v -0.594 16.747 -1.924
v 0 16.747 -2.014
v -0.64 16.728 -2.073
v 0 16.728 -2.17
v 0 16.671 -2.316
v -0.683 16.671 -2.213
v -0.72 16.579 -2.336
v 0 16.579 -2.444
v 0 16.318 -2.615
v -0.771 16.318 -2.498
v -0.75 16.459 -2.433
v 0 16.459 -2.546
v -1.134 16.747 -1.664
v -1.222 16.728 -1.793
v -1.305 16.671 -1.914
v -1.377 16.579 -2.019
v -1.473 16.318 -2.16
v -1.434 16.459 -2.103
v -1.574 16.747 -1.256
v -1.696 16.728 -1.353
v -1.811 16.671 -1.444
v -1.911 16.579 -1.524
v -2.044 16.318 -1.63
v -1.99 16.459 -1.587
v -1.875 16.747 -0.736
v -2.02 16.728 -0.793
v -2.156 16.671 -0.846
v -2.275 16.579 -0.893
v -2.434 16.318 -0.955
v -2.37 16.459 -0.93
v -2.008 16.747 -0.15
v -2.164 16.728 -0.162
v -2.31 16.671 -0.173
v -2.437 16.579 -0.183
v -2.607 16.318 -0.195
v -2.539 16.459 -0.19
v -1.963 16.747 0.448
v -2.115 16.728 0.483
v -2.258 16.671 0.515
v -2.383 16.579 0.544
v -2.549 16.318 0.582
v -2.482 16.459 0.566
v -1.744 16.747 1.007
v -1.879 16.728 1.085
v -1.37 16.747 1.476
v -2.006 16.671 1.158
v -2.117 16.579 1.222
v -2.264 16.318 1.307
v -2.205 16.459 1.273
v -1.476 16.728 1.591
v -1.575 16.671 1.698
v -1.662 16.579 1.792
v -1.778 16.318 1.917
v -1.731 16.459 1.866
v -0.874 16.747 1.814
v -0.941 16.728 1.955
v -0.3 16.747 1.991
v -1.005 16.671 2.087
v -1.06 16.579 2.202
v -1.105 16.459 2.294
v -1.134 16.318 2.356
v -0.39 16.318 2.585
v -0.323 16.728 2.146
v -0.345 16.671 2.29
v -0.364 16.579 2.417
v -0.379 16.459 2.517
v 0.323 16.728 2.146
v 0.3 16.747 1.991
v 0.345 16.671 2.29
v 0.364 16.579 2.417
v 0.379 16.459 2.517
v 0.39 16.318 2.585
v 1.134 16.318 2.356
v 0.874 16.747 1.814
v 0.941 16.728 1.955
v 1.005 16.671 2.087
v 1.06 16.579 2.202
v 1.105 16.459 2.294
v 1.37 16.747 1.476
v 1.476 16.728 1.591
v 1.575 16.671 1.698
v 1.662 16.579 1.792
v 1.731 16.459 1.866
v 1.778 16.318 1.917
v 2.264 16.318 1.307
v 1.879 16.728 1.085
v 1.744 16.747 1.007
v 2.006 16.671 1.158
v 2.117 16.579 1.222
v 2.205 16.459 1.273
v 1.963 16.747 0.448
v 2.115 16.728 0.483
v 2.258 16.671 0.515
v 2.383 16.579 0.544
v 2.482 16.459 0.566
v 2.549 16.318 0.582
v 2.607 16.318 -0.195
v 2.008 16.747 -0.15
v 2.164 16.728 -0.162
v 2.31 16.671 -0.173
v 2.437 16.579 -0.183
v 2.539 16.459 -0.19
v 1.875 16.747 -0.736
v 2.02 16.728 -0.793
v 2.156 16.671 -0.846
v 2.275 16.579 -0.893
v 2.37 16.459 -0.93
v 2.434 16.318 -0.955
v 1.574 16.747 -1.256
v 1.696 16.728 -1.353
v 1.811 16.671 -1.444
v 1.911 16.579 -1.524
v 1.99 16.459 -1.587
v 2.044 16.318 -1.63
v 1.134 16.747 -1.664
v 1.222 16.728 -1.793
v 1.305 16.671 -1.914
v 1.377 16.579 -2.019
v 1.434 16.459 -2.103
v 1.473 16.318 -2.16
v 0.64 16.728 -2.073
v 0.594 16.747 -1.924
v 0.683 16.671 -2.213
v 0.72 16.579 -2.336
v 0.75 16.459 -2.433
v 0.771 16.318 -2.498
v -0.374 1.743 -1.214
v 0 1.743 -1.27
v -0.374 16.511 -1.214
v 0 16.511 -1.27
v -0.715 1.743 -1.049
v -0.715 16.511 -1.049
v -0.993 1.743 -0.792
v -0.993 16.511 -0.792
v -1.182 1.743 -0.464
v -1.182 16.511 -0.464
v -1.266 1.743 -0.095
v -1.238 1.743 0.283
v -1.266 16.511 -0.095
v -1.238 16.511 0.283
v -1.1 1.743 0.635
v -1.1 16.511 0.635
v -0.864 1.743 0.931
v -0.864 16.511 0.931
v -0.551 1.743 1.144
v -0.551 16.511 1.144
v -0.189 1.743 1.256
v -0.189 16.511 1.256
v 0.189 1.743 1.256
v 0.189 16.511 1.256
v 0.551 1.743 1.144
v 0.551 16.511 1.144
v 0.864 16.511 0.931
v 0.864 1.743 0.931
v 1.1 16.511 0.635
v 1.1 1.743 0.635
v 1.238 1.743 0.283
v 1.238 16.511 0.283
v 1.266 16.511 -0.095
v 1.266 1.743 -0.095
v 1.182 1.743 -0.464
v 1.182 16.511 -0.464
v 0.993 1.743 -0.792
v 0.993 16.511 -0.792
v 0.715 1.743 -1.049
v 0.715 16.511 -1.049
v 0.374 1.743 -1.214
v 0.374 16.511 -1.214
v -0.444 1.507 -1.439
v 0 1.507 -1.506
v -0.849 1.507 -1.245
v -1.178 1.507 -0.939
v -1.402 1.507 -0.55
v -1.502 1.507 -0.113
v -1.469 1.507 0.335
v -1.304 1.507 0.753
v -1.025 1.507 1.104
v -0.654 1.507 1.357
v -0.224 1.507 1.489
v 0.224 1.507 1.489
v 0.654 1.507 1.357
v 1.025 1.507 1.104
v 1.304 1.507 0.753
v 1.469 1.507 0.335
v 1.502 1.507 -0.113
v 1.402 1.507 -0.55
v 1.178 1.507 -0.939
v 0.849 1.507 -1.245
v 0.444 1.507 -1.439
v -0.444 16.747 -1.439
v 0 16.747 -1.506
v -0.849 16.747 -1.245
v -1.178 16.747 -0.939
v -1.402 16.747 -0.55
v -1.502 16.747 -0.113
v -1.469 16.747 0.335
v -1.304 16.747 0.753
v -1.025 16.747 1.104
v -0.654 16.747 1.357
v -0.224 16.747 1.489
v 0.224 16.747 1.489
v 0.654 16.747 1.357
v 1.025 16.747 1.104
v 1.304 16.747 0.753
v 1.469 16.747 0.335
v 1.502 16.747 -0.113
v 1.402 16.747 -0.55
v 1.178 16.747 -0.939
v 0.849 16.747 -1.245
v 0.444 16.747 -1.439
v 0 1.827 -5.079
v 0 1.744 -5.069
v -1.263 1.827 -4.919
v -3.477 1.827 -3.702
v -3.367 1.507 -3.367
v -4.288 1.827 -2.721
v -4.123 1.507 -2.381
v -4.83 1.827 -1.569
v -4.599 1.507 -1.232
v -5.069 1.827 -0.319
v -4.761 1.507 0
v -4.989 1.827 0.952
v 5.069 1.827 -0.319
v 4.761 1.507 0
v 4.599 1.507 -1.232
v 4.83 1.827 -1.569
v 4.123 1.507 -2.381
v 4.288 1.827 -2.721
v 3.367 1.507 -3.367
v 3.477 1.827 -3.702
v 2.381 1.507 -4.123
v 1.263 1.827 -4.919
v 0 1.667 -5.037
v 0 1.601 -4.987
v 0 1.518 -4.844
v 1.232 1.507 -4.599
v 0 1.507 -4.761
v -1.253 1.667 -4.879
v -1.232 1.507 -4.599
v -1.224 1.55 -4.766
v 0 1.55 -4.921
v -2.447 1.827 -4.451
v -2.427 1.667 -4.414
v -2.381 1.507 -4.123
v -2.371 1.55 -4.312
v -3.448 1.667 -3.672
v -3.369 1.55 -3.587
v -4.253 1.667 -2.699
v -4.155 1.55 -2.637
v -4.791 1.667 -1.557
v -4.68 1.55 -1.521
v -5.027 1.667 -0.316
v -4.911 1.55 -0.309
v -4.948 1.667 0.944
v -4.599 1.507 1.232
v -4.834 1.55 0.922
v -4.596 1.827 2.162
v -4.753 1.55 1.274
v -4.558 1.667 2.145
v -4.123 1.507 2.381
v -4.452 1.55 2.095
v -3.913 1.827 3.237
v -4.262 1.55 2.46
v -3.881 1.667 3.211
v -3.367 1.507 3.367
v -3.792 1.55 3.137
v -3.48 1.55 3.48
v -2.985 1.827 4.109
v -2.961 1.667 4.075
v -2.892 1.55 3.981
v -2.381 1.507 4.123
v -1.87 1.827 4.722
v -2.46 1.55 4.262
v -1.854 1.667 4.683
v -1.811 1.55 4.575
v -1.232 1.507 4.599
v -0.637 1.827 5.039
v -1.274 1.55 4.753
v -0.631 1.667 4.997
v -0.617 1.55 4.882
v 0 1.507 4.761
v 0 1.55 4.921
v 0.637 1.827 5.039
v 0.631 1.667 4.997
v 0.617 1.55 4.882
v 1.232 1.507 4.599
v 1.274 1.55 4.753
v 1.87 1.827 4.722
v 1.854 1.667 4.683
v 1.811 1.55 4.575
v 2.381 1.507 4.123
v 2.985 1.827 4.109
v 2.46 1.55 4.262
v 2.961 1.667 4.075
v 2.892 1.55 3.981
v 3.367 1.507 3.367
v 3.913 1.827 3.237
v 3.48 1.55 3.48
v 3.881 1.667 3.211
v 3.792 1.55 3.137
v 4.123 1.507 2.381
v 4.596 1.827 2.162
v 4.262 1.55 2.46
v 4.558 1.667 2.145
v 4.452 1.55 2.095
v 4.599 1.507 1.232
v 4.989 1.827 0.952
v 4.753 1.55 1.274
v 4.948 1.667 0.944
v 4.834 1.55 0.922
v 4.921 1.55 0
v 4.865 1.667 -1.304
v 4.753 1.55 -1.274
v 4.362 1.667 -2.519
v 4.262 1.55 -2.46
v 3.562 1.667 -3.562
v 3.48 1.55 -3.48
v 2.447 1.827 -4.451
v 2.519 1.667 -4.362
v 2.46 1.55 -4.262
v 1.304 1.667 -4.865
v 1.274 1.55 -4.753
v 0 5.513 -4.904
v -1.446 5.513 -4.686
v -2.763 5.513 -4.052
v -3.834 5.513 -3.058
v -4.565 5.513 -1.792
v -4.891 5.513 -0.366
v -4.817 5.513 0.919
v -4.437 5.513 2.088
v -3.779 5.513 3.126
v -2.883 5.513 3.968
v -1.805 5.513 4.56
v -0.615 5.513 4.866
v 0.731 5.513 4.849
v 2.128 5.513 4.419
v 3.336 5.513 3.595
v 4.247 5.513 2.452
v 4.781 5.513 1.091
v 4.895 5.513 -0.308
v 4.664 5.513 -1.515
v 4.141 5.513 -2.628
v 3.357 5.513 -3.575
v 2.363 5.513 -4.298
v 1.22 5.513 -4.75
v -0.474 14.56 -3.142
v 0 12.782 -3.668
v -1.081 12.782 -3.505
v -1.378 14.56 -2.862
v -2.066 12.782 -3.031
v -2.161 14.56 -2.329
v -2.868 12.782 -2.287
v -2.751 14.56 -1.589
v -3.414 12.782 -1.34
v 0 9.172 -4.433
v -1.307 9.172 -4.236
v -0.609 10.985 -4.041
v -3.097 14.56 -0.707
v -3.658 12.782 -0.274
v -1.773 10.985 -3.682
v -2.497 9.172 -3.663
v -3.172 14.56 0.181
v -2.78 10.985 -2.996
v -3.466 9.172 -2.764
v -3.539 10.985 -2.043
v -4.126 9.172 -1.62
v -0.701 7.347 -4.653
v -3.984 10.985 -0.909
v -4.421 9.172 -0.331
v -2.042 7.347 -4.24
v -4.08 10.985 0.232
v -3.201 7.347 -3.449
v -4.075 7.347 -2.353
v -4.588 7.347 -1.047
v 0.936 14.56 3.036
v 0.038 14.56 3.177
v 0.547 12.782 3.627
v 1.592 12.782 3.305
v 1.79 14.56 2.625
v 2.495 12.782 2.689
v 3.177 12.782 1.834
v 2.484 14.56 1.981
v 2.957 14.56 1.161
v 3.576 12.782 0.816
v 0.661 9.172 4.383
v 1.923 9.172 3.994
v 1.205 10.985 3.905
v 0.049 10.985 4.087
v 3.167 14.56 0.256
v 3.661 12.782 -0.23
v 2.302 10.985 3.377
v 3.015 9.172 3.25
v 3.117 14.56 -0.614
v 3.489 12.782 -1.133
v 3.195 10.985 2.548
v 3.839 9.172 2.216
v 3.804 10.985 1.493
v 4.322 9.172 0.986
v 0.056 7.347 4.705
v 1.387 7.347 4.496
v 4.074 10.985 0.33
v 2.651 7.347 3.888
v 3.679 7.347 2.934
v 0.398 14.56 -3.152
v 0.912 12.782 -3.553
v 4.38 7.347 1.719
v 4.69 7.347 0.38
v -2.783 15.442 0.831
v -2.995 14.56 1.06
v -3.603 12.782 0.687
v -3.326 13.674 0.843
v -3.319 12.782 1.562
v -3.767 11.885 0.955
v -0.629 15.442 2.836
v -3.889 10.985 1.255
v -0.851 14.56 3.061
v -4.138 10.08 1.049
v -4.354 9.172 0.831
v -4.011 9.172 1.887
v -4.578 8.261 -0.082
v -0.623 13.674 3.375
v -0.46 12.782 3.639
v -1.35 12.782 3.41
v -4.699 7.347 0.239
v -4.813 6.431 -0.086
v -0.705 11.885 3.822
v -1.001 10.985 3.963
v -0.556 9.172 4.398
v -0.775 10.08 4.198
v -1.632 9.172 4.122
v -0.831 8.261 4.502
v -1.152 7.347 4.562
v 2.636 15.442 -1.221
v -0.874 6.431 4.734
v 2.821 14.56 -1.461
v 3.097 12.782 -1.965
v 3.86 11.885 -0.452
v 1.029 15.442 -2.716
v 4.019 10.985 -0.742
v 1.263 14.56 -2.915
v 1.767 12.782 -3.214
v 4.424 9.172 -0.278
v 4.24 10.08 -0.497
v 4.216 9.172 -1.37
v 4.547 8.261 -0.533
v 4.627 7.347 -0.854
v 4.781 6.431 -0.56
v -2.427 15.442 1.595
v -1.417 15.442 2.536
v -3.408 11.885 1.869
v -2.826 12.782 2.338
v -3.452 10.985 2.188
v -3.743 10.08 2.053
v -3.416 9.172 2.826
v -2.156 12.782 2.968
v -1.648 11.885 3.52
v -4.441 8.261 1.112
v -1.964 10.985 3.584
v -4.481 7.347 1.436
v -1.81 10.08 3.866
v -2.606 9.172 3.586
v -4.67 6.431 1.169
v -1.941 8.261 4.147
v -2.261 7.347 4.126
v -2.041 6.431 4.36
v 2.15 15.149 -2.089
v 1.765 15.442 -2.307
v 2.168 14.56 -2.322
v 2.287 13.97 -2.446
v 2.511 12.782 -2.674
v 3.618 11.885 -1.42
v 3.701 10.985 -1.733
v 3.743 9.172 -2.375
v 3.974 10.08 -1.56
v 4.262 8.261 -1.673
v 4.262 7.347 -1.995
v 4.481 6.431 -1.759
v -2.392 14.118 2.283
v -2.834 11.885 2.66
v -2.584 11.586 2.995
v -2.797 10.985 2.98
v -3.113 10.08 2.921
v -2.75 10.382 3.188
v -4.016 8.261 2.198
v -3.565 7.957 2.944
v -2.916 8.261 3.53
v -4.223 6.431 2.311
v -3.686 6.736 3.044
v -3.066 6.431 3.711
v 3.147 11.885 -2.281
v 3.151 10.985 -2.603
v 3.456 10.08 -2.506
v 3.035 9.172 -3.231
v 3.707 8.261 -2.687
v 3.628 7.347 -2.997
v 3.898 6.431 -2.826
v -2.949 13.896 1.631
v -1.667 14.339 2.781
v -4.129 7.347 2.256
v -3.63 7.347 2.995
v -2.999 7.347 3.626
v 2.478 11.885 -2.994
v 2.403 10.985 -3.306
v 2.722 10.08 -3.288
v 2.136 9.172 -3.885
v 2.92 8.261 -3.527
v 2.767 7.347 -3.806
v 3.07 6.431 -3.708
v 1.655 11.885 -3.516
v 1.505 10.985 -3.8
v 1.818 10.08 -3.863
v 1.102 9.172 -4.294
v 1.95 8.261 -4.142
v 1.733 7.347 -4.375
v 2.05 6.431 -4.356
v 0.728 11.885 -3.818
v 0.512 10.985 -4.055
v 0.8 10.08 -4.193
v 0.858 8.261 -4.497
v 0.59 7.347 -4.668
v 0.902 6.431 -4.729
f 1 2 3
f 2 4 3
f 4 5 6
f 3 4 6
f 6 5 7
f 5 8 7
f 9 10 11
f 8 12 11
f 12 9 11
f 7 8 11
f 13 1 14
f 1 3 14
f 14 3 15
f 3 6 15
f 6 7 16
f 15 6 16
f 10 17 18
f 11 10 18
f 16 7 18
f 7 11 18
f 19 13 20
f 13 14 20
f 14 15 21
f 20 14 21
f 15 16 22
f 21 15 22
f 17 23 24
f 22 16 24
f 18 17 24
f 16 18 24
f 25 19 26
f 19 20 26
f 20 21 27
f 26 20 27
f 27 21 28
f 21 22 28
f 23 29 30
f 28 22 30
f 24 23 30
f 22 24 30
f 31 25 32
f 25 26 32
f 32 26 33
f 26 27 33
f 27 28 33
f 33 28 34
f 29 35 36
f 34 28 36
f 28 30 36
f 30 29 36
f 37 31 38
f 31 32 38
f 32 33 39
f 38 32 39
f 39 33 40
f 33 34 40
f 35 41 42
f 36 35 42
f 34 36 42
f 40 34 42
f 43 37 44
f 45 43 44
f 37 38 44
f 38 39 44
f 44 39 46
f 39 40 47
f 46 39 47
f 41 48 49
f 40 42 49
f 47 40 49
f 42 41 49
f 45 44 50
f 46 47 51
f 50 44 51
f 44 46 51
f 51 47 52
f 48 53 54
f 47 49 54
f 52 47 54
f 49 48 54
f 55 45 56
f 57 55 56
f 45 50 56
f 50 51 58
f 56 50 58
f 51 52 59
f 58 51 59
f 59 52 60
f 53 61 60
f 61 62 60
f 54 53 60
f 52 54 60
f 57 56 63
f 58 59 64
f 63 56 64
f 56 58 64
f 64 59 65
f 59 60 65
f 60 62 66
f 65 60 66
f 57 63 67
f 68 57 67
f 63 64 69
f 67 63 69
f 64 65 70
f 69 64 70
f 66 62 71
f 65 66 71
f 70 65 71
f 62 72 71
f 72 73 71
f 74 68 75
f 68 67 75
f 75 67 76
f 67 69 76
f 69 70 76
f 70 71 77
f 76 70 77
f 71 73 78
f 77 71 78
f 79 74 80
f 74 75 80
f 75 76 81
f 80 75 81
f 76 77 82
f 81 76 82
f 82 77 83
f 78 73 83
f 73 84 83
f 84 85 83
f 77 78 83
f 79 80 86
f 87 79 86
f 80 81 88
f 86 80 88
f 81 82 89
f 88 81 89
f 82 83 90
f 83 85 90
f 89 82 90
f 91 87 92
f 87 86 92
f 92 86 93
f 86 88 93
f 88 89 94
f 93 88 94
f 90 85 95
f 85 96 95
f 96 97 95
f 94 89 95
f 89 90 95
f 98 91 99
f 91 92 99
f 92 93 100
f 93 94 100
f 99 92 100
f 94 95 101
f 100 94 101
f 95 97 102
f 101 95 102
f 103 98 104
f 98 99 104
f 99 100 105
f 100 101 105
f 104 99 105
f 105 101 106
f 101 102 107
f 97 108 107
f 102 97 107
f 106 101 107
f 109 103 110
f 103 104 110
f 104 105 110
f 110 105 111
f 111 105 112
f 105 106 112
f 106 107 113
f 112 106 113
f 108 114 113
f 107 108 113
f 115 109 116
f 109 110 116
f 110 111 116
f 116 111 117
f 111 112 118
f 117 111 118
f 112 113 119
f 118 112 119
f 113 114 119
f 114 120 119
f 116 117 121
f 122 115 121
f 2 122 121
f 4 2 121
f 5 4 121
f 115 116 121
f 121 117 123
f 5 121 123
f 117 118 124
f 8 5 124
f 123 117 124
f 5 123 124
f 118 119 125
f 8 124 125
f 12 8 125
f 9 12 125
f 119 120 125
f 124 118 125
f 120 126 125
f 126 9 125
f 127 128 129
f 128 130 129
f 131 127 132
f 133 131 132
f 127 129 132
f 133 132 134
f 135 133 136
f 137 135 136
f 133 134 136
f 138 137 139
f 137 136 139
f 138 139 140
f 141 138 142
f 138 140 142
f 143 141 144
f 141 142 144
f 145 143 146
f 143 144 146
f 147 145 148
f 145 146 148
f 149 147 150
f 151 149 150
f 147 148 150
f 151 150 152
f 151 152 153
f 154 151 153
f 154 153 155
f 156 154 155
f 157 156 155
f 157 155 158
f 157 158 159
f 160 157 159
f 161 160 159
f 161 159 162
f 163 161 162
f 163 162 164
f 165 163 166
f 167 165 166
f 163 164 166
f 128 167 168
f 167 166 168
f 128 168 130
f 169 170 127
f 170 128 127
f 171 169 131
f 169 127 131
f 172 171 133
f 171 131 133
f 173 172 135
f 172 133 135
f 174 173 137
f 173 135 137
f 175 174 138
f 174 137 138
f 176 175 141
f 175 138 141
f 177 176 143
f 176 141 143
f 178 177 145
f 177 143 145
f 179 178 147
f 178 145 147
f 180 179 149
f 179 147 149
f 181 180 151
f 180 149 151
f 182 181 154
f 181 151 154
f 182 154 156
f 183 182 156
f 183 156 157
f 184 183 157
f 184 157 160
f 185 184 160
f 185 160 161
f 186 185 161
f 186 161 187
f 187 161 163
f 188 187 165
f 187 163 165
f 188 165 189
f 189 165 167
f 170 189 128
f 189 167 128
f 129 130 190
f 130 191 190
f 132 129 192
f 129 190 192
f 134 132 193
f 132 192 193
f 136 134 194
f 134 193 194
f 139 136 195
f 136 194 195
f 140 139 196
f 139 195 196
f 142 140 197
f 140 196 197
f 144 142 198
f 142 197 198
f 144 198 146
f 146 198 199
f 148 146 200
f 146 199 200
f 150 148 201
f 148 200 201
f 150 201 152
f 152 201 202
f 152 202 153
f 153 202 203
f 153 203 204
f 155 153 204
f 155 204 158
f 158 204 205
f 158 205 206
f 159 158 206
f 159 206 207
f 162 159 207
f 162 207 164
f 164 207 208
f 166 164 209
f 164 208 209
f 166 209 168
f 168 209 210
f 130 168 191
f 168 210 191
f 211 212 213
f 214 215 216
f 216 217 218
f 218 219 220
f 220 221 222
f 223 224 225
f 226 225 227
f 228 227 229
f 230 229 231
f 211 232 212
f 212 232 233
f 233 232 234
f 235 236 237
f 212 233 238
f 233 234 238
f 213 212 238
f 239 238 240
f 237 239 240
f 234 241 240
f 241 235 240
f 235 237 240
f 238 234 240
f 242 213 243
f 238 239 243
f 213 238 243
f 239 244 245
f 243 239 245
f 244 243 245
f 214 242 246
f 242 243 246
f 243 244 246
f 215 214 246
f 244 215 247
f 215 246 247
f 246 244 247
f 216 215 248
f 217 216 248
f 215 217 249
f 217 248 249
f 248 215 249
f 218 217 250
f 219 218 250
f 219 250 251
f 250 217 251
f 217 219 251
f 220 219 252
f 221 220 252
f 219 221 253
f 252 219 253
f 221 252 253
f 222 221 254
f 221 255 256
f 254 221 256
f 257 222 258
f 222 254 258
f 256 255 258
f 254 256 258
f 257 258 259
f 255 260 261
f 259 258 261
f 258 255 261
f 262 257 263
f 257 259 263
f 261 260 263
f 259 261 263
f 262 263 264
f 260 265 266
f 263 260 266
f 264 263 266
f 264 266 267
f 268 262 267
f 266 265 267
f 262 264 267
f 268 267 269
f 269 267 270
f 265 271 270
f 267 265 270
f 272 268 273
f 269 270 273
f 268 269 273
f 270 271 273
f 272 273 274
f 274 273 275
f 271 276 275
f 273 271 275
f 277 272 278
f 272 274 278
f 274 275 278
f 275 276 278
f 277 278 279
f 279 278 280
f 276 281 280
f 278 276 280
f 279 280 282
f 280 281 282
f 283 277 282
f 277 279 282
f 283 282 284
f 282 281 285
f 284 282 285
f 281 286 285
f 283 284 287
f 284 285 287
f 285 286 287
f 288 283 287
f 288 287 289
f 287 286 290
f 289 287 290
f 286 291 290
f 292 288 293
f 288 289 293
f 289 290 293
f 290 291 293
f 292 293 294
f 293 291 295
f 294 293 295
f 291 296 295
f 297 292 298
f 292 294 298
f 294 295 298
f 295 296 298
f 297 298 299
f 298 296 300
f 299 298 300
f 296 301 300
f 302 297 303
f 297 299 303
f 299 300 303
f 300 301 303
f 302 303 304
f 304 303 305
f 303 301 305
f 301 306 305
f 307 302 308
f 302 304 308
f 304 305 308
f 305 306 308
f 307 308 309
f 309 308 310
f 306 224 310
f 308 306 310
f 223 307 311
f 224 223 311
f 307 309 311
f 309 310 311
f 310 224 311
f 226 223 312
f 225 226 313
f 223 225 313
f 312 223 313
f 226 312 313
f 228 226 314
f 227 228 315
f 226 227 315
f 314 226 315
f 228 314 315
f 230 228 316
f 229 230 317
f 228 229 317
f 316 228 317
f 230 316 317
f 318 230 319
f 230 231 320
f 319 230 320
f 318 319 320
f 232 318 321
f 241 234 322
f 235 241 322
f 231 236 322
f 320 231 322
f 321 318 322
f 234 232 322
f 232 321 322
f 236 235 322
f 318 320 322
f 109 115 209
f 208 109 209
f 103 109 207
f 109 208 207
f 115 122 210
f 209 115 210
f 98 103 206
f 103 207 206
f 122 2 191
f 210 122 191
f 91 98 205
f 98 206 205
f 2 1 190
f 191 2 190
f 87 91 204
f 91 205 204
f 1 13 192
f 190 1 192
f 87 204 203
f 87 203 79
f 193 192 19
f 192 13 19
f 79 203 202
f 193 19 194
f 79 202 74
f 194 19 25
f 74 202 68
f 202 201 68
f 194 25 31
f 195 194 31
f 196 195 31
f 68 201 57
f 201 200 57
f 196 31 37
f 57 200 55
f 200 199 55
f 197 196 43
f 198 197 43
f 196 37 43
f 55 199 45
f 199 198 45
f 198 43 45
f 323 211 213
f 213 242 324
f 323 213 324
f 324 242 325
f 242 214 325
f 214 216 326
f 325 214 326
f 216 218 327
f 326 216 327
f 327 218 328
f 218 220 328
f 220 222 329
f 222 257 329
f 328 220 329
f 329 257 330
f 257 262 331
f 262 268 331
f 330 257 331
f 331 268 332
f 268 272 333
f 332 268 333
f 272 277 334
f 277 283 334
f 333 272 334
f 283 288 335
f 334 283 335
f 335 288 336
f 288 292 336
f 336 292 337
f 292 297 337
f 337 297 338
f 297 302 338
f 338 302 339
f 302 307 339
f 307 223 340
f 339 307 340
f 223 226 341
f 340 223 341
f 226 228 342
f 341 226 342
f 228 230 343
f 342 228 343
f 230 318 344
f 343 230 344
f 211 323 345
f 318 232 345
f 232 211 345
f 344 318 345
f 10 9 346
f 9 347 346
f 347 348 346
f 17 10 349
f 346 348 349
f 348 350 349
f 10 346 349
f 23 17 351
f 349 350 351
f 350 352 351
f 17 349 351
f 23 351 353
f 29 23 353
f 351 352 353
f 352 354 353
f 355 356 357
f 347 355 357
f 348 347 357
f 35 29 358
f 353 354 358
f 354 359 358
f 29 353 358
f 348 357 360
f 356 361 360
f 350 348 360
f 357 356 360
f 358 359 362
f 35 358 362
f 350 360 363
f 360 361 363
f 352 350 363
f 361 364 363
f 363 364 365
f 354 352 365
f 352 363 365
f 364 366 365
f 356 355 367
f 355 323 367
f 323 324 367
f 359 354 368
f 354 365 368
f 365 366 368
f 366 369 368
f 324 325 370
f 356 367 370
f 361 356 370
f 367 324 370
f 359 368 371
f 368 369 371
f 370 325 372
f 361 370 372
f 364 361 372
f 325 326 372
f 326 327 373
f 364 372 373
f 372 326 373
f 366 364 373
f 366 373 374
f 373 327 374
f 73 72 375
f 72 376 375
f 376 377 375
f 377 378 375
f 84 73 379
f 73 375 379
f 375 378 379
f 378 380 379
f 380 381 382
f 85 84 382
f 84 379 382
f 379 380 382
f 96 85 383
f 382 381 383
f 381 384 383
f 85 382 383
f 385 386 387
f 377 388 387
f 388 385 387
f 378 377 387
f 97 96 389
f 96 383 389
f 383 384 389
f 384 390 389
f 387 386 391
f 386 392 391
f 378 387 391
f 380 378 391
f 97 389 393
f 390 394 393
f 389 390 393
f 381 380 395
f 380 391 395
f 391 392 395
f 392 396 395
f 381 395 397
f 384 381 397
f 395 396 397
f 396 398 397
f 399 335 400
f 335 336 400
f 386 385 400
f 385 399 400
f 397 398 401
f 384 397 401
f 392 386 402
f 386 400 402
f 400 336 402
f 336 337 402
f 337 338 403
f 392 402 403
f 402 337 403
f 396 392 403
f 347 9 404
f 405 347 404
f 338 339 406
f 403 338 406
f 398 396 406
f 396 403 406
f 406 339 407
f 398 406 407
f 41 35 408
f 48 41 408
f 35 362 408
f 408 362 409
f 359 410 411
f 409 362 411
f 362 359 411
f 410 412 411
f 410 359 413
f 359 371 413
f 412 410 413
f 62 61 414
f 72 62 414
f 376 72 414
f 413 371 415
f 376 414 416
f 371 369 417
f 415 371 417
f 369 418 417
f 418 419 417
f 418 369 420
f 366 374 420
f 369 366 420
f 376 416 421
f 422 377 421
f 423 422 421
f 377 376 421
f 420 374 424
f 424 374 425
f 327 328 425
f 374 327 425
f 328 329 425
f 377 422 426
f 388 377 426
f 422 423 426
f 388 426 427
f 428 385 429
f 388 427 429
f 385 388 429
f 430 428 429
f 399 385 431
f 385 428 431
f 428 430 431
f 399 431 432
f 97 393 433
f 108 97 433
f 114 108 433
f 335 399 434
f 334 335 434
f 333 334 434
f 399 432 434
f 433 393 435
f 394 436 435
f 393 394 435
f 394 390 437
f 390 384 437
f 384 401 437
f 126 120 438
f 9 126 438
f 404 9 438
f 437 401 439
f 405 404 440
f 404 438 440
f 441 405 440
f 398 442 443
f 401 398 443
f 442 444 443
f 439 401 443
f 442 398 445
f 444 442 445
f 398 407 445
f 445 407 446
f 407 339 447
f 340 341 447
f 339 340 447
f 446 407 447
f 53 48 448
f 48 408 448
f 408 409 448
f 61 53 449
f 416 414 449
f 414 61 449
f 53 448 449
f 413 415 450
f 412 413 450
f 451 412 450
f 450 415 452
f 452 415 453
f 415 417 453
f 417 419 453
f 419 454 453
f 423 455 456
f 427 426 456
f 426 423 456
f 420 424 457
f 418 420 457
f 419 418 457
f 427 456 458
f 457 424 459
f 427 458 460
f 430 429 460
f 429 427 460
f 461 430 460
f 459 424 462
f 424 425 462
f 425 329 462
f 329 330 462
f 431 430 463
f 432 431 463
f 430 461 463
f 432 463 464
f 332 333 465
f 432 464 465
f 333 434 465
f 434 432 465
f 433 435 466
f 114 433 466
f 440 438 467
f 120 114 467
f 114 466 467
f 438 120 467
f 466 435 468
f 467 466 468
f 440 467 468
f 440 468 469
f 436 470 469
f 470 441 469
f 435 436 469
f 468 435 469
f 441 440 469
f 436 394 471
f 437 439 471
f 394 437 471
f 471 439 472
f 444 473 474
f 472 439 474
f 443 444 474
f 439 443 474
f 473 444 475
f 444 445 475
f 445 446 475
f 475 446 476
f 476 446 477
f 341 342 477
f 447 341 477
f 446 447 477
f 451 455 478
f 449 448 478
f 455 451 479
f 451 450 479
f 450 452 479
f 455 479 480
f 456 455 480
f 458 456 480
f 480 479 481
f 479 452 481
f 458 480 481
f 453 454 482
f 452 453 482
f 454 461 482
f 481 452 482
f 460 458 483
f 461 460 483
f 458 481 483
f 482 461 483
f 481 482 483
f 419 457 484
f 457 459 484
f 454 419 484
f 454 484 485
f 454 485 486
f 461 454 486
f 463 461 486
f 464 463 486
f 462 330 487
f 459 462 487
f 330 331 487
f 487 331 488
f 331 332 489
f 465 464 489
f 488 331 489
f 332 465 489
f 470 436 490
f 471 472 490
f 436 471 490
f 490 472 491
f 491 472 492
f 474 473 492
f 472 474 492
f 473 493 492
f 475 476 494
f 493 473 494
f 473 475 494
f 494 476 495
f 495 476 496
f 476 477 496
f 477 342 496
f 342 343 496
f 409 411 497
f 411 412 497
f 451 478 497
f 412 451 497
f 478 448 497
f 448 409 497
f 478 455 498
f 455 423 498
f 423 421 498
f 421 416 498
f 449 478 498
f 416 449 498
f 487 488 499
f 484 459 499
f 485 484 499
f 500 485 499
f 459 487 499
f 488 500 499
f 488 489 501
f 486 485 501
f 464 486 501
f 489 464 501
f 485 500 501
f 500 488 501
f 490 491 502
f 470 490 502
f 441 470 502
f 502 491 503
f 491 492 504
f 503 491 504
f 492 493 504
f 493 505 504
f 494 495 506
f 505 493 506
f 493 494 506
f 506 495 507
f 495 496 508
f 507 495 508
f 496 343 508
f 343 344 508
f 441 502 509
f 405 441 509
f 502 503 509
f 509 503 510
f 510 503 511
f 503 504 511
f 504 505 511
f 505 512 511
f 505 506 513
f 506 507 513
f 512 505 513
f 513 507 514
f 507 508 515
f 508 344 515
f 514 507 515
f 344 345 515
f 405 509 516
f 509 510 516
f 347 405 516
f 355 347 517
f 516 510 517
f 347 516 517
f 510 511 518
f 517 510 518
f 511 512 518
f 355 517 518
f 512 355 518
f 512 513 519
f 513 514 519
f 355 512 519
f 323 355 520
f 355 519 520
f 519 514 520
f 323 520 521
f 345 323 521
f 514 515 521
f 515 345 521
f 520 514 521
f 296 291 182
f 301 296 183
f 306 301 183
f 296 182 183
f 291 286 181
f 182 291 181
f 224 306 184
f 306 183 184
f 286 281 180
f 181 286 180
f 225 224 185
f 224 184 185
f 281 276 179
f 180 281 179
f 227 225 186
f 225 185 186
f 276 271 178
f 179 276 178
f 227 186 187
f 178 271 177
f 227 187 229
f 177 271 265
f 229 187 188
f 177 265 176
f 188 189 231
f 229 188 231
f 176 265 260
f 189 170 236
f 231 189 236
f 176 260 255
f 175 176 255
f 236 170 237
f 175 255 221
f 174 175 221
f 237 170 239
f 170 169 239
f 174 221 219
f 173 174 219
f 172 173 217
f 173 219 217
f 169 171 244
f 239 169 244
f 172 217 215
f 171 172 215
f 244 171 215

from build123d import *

# Parameters (mm, degrees)
SCALE1_SCALE = 0.8


with BuildPart() as part:
    # Sketch1 → Revolve1 (revolve)
    with BuildSketch(Plane(origin=(0, 0, 0), x_dir=(0, 0, -1), z_dir=(1, 0, 0))):
        with BuildLine():
            Line((1.5875, 0.295348837), (1.5875, 18.754651163))
            Line((1.5875, 18.754651163), (1.882848837, 19.05))
            Line((1.882848837, 19.05), (2.517316605, 19.05))
            ThreePointArc((2.517316605, 19.05), (2.978804363, 18.902058108), (3.268264727, 18.513380282))
            ThreePointArc((3.268264727, 18.513380282), (5.541145691, 9.581116964), (6.348602604, 0.39965035))
            ThreePointArc((6.348602604, 0.39965035), (6.233349837, 0.117224952), (5.951737308, 0))
            Line((5.951737308, 0), (1.882848837, 0))
            Line((1.882848837, 0), (1.5875, 0.295348837))
        make_face()
    revolve(axis=Axis((0, 0, 0), (0, 1, 0)))


with BuildPart() as part_1:
    # Scale1: scaled about (0, 7.536075139, 0)
    add(part.part.scale(SCALE1_SCALE).moved(Location((0, 1.507215028, 0))))


solid = part_1.part
